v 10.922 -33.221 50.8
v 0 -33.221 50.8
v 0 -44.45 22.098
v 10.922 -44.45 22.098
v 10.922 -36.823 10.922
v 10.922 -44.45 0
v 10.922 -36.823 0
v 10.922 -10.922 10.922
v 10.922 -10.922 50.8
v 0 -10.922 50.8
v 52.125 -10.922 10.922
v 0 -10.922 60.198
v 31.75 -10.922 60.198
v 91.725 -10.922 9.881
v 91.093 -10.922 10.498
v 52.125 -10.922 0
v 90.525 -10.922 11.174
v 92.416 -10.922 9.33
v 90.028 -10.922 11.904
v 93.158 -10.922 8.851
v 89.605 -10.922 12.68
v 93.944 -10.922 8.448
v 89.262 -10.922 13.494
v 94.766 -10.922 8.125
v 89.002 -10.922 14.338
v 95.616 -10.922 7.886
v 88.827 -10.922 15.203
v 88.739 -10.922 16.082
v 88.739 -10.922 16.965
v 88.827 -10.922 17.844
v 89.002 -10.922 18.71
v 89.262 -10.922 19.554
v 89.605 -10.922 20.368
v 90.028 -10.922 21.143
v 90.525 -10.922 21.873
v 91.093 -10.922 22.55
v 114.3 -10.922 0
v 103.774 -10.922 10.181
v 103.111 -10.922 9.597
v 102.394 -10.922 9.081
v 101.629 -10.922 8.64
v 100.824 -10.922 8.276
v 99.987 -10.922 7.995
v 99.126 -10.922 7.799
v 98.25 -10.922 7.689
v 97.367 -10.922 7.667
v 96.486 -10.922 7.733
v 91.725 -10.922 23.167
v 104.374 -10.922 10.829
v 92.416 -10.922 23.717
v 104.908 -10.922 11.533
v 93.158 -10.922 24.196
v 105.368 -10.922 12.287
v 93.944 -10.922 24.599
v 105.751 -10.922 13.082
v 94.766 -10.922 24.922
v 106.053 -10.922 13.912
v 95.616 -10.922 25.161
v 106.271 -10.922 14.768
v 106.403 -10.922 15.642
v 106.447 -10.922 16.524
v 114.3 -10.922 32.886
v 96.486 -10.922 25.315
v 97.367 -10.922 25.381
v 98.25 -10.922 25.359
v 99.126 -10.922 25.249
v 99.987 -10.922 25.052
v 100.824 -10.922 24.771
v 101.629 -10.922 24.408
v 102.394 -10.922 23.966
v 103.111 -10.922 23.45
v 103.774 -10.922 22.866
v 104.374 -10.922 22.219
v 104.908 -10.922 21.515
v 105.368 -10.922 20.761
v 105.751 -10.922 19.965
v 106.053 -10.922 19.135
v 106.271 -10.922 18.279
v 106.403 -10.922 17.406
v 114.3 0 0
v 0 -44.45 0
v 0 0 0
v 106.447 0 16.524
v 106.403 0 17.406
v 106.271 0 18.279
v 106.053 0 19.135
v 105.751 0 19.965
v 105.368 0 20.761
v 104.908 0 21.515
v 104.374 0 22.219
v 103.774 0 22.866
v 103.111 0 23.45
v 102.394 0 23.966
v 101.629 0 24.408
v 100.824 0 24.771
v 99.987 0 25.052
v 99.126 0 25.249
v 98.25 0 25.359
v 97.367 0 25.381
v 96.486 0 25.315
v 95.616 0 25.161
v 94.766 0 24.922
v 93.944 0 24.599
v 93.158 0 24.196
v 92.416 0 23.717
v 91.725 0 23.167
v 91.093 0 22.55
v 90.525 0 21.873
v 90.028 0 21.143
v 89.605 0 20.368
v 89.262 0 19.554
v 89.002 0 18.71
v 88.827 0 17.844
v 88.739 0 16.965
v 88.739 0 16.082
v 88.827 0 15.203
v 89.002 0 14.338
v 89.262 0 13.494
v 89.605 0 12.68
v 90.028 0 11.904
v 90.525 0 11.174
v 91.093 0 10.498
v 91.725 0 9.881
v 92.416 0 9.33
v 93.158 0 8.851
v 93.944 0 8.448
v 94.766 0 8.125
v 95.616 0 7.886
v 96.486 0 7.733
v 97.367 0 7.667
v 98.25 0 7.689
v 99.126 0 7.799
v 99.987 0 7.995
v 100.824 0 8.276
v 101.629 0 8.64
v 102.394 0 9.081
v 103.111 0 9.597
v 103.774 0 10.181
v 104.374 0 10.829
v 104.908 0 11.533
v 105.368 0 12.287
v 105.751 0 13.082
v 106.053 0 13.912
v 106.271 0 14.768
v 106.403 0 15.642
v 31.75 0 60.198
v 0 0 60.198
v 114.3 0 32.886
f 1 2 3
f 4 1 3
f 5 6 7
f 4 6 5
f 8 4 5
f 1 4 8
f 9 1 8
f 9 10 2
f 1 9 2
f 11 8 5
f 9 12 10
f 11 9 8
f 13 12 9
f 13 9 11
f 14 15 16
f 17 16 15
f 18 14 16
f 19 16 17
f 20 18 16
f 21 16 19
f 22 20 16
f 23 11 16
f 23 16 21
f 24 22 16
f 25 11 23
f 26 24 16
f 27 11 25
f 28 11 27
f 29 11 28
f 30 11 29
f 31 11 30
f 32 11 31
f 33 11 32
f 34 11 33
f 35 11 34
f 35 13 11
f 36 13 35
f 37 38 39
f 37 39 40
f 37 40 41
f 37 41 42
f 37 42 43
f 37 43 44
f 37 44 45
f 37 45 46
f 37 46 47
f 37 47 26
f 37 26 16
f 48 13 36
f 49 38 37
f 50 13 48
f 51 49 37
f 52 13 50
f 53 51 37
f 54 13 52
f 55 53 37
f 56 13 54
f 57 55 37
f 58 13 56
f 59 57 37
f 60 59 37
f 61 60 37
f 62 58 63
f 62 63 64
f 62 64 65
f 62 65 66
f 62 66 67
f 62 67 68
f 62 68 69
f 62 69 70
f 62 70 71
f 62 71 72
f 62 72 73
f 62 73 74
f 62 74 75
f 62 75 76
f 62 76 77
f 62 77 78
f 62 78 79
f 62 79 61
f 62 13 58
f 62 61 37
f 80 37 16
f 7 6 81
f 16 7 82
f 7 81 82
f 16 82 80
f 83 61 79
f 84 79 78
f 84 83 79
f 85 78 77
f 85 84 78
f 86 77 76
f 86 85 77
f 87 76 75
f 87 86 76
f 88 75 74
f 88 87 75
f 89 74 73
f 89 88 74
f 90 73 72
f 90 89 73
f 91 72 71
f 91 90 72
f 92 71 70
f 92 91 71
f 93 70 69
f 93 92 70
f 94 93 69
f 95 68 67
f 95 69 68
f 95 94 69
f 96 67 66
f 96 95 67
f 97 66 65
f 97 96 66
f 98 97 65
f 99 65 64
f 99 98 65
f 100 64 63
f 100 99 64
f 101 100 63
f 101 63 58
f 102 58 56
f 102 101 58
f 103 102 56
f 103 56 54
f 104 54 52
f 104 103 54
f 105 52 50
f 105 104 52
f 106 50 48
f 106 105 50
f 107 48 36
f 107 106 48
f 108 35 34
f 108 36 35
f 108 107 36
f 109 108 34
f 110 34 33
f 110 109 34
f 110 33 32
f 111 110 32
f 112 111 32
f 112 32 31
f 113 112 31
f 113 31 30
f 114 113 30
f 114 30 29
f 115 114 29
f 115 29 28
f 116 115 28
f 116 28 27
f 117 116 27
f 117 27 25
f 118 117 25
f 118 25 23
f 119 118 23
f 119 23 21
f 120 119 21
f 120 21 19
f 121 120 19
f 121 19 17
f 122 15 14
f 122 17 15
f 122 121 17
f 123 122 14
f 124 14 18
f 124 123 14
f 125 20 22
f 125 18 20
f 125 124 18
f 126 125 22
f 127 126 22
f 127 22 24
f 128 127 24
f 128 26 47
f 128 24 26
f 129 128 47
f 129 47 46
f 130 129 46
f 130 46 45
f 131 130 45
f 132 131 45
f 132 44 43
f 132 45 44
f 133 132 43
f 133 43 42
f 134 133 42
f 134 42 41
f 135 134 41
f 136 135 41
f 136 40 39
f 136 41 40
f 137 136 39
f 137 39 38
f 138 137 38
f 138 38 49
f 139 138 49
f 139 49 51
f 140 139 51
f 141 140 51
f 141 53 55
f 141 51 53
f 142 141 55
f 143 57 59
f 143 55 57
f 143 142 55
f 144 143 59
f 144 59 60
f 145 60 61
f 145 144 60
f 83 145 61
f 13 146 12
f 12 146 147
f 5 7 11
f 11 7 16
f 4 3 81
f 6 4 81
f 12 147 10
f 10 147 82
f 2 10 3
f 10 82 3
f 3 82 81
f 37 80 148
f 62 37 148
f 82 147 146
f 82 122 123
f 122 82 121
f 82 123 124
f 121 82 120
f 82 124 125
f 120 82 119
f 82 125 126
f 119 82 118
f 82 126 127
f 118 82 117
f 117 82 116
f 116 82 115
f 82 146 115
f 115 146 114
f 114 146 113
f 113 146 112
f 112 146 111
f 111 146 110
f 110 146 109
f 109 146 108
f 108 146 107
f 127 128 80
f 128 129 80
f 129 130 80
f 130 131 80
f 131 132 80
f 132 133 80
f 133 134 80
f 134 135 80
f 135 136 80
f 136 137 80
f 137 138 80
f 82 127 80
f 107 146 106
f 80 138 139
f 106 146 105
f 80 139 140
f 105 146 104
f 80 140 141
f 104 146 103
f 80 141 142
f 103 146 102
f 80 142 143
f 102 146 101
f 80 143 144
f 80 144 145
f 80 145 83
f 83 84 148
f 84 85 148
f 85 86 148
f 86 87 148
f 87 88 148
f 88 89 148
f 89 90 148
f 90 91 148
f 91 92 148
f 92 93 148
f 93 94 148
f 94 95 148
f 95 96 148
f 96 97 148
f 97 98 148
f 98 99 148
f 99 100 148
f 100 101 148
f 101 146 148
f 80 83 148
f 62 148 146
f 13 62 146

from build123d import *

# Parameters (mm, degrees)
F1_DEPTH = 10.922
F3_DEPTH = 10.922
F5_DEPTH = 10.922
F6_R     = 8.859667
F7_DEPTH = 88.646


with BuildPart() as f1:
    # F0 (on Front) → F1 (new body)
    with BuildSketch(Plane.XZ):
        Polygon((31.75, 60.198), (0, 60.198), (0, 0), (114.3, 0), (114.3, 32.885686), align=None)
    extrude(amount=F1_DEPTH)

    # F2 (on Right) → F3 (join)
    with BuildSketch(Plane.YZ):
        Polygon((-44.45, 0), (0, 0), (0, 50.8), (-33.220524, 50.8), (-44.45, 22.098), align=None)
    extrude(amount=F3_DEPTH)

    # F4 (on Top) → F5 (join)
    with BuildSketch(Plane.XY):
        Polygon((52.578, -10.637136), (0, -10.637136), (0, -43.688301), align=None)
    extrude(amount=F5_DEPTH)

    # F6 (on Front) → F7 (cut)
    with BuildSketch(Plane.XZ):
        with Locations((97.587422, 16.523723)):
            Circle(F6_R)
    extrude(amount=F7_DEPTH, mode=Mode.SUBTRACT)


solid = f1.part
